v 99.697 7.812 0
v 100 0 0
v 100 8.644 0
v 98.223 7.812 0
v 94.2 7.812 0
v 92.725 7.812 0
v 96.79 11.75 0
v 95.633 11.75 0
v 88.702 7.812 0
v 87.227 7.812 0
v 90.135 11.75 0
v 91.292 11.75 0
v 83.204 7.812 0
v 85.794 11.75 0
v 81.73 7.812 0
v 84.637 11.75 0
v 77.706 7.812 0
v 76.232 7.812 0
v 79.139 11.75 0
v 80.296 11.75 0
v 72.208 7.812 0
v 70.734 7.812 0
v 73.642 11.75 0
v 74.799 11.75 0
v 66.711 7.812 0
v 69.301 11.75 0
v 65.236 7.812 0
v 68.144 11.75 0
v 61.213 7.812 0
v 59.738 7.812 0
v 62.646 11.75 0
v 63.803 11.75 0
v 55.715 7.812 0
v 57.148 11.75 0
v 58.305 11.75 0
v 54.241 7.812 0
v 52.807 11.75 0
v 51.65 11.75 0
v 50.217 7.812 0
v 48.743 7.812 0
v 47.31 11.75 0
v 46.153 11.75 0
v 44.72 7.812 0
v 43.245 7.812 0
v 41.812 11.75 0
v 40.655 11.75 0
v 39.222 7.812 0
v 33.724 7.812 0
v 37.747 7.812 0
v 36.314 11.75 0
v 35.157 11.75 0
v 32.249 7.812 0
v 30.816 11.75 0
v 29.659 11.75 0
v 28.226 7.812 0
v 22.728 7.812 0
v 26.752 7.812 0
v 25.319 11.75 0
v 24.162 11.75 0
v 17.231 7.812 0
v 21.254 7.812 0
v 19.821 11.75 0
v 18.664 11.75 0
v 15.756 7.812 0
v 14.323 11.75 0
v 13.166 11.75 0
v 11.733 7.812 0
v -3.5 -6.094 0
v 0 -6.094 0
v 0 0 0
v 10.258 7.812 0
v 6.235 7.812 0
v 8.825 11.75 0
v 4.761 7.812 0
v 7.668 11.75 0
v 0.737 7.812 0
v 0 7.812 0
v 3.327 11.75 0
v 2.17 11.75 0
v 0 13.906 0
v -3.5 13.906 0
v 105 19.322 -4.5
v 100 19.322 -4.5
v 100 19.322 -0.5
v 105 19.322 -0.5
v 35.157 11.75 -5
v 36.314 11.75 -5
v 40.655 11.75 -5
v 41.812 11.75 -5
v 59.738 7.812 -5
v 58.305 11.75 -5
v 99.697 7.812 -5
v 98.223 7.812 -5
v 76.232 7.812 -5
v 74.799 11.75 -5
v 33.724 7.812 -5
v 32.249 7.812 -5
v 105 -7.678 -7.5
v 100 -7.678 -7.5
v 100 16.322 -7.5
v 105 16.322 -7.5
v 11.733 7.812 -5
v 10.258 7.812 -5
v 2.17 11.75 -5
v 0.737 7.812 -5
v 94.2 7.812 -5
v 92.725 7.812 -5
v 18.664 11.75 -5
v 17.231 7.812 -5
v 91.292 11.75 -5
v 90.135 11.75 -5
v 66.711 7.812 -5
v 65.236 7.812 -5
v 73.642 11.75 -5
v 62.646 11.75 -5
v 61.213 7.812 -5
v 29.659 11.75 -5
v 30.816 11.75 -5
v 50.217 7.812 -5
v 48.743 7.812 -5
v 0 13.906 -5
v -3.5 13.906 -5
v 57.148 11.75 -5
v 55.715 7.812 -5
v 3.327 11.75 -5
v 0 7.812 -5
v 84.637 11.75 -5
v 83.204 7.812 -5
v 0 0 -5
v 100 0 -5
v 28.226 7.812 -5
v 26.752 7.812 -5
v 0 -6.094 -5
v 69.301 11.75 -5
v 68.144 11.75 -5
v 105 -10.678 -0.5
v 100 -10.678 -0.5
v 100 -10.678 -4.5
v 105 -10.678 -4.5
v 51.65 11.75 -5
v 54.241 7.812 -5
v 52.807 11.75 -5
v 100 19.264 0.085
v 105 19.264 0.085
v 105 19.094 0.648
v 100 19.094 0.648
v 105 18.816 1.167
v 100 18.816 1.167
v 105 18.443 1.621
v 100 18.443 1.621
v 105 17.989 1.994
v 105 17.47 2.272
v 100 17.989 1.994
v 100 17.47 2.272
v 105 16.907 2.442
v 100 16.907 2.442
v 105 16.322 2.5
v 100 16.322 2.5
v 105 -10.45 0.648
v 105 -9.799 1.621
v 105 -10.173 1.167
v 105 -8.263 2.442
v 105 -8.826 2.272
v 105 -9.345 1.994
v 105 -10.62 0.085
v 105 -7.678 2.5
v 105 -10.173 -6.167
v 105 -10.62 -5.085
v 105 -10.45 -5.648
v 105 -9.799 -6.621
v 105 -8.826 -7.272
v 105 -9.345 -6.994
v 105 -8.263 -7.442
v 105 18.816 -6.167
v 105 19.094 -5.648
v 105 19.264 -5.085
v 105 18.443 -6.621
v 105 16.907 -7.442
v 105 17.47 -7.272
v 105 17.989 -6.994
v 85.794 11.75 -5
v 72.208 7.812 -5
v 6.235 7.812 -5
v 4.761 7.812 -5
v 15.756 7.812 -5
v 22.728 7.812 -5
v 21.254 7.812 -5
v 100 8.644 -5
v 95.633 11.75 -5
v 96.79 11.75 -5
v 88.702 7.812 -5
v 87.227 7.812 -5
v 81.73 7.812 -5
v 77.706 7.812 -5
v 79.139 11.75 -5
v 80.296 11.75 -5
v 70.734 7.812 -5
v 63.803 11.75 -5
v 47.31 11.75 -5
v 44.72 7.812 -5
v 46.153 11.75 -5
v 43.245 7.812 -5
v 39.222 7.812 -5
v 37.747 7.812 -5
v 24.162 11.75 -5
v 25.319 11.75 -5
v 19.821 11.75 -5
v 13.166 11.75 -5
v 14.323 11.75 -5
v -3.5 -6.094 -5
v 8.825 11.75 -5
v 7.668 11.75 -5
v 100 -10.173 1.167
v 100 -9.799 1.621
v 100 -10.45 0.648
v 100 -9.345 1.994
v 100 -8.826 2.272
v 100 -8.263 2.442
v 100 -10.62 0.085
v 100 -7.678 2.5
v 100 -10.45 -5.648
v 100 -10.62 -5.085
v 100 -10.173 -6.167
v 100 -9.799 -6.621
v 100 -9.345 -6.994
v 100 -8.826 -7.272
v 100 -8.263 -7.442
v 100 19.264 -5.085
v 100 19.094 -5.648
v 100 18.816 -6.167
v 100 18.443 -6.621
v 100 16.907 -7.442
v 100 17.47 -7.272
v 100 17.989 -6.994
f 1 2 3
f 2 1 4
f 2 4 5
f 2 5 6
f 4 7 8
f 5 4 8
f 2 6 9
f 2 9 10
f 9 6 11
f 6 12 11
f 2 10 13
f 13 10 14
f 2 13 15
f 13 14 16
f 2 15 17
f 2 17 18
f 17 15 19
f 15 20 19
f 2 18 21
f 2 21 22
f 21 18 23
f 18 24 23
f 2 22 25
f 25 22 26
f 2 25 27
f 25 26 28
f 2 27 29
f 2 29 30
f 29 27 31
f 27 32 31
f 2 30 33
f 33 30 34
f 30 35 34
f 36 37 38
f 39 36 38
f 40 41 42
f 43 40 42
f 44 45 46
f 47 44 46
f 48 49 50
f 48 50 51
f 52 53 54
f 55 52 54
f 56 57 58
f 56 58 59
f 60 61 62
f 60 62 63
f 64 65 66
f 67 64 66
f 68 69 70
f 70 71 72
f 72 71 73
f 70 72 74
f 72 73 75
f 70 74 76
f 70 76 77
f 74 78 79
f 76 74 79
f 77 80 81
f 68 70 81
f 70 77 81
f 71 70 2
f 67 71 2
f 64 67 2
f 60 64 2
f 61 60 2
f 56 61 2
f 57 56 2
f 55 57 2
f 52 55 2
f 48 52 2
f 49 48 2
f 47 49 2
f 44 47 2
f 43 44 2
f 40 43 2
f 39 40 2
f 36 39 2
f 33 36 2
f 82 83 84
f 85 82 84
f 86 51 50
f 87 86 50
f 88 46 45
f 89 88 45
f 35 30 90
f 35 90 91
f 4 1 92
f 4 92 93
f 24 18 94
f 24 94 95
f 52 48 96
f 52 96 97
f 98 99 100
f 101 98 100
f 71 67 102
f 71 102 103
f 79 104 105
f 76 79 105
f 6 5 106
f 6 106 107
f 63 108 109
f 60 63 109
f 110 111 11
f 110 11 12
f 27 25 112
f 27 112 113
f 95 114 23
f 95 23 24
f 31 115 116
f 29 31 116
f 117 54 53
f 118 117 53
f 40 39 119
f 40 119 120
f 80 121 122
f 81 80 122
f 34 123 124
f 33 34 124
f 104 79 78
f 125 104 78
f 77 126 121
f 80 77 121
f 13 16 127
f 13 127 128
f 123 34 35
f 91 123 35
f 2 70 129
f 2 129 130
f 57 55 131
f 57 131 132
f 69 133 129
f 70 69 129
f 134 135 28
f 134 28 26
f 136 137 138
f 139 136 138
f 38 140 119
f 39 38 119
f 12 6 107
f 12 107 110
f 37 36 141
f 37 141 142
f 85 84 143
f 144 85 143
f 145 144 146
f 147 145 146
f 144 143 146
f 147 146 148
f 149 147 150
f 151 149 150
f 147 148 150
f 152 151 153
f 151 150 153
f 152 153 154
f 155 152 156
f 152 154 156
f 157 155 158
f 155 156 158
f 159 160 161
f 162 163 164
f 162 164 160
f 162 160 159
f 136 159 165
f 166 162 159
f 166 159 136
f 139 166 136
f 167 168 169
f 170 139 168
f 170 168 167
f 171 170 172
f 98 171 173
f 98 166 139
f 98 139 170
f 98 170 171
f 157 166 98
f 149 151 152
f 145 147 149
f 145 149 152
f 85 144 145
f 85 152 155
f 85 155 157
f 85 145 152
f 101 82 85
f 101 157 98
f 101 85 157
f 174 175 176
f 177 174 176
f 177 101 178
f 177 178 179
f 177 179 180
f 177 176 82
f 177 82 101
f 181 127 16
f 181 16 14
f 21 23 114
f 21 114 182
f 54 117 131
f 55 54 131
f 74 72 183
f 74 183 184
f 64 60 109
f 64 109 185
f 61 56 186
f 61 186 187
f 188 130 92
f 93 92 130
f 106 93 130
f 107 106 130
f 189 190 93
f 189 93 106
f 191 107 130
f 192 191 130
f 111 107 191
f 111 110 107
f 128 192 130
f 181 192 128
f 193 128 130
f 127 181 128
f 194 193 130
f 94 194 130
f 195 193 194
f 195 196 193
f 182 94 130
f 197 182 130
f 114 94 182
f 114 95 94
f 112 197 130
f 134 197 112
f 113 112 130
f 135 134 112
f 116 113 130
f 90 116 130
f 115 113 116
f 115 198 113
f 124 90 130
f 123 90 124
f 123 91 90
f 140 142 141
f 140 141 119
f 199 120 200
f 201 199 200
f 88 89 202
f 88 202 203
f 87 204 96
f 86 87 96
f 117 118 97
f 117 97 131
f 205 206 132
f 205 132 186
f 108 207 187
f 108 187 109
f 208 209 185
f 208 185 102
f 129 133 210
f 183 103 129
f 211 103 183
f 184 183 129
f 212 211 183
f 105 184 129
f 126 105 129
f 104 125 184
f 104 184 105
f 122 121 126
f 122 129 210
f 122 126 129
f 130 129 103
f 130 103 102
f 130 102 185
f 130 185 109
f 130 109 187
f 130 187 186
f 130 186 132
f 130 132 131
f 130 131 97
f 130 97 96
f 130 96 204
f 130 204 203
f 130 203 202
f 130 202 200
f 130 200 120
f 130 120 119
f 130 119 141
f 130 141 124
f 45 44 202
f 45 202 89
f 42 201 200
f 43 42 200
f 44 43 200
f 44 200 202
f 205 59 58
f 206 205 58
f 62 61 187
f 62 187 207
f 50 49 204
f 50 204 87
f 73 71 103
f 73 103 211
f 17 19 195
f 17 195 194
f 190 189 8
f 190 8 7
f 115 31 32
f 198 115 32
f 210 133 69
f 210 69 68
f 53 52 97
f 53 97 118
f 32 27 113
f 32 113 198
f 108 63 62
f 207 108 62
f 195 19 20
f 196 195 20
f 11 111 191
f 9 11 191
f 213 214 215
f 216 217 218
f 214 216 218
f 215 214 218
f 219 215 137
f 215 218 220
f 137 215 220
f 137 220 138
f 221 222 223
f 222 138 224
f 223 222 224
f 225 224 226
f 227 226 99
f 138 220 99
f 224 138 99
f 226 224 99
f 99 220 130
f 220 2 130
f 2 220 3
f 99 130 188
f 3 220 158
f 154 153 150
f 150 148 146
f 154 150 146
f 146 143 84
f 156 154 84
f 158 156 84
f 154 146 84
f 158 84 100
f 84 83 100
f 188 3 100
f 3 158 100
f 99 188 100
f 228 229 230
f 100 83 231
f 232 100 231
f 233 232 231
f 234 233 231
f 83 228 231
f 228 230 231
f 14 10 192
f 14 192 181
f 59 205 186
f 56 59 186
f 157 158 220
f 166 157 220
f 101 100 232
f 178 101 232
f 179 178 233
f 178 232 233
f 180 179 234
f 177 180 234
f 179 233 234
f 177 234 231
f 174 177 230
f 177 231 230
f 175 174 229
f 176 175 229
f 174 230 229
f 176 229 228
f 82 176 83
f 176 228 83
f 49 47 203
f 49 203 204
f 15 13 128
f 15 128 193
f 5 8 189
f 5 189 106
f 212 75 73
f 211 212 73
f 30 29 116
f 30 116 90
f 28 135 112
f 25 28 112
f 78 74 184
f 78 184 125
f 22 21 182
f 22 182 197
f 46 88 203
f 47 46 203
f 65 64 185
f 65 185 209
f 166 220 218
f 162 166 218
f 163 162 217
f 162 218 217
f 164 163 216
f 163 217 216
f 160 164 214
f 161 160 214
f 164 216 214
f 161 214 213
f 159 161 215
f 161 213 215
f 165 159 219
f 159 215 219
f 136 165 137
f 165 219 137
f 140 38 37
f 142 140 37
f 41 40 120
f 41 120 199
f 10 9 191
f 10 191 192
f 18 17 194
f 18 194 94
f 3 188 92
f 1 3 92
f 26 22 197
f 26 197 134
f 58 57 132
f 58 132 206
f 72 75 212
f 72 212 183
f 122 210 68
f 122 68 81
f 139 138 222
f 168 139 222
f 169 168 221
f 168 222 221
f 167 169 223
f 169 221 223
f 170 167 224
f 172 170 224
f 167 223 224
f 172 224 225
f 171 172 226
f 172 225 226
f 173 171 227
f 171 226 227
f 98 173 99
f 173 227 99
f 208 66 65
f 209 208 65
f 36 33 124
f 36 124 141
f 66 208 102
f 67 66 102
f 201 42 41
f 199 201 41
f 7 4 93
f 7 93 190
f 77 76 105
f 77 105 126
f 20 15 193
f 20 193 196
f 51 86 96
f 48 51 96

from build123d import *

# Parameters (mm, degrees)
BLANKSKE_W         = 100
BLANKSKE_H         = 11.75
BLANK_DEPTH        = 5
TOOTHCUTSIM_DEPTH  = 101.812015653
TEETHCUTS_COUNT    = 19
TEETHCUTS_PITCH    = 5.497787138
ESQUISSE1_W        = 3.5
ESQUISSE1_H        = 20
BOSS_EXTRU_1_DEPTH = 5
BOSS_EXTRU_2_DEPTH = 5


with BuildPart() as part:
    # BlankSke → Blank (new body)
    with BuildSketch(Plane.XY):
        with Locations((50, 5.875)):
            Rectangle(BLANKSKE_W, BLANKSKE_H)
    extrude(amount=-BLANK_DEPTH)

    # TooCutSkeSim → ToothCutSim (cut, through all)
    with BuildSketch(Plane.XY):
        Polygon((0.737261897, 7.8125), (-0.737261897, 7.8125), (-2.179639538, 11.7754), (2.179639538, 11.7754), align=None)
    toothcutsim = extrude(amount=-TOOTHCUTSIM_DEPTH, mode=Mode.SUBTRACT)

    # TeethCuts: ToothCutSim ×19
    with Locations(*[(i * TEETHCUTS_PITCH, 0, 0) for i in range(1, TEETHCUTS_COUNT)]):
        add(toothcutsim, mode=Mode.SUBTRACT)

    # Esquisse1 → Boss.-Extru.1 (add, through all)
    with BuildSketch(Plane(origin=(0, 0, -5), x_dir=(-1, 0, 0), z_dir=(0, 0, -1))):
        with Locations((1.75, 3.90625)):
            Rectangle(ESQUISSE1_W, ESQUISSE1_H)
    extrude(amount=-BOSS_EXTRU_1_DEPTH)

    # Esquisse4 → Boss.-Extru.2 (add)
    with BuildSketch(Plane(origin=(100, 0, 0), x_dir=(0, 0, -1), z_dir=(1, 0, 0))):
        with BuildLine():
            Line((0.5, -10.67809839), (4.5, -10.67809839))
            ThreePointArc((4.5, -10.67809839), (6.621320344, -9.799418733), (7.5, -7.67809839))
            Line((7.5, -7.67809839), (7.5, 16.32190161))
            ThreePointArc((7.5, 16.32190161), (6.621320344, 18.443221954), (4.5, 19.32190161))
            Line((4.5, 19.32190161), (0.5, 19.32190161))
            ThreePointArc((0.5, 19.32190161), (-1.621320344, 18.443221954), (-2.5, 16.32190161))
            Line((-2.5, 16.32190161), (-2.5, -7.67809839))
            ThreePointArc((-2.5, -7.67809839), (-1.621320344, -9.799418733), (0.5, -10.67809839))
        make_face()
    extrude(amount=BOSS_EXTRU_2_DEPTH)


solid = part.part
